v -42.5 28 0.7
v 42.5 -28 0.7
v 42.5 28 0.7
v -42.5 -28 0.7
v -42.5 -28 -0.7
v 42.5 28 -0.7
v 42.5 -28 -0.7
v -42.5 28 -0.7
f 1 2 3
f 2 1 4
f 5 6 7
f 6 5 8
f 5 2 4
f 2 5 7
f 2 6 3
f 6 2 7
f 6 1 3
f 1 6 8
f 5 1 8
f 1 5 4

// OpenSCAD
$fn=64;

module sbc_board(length=85.0, width=56.0, thickness=1.4) {
    cube([length, width, thickness], center=true);
}

sbc_board();
